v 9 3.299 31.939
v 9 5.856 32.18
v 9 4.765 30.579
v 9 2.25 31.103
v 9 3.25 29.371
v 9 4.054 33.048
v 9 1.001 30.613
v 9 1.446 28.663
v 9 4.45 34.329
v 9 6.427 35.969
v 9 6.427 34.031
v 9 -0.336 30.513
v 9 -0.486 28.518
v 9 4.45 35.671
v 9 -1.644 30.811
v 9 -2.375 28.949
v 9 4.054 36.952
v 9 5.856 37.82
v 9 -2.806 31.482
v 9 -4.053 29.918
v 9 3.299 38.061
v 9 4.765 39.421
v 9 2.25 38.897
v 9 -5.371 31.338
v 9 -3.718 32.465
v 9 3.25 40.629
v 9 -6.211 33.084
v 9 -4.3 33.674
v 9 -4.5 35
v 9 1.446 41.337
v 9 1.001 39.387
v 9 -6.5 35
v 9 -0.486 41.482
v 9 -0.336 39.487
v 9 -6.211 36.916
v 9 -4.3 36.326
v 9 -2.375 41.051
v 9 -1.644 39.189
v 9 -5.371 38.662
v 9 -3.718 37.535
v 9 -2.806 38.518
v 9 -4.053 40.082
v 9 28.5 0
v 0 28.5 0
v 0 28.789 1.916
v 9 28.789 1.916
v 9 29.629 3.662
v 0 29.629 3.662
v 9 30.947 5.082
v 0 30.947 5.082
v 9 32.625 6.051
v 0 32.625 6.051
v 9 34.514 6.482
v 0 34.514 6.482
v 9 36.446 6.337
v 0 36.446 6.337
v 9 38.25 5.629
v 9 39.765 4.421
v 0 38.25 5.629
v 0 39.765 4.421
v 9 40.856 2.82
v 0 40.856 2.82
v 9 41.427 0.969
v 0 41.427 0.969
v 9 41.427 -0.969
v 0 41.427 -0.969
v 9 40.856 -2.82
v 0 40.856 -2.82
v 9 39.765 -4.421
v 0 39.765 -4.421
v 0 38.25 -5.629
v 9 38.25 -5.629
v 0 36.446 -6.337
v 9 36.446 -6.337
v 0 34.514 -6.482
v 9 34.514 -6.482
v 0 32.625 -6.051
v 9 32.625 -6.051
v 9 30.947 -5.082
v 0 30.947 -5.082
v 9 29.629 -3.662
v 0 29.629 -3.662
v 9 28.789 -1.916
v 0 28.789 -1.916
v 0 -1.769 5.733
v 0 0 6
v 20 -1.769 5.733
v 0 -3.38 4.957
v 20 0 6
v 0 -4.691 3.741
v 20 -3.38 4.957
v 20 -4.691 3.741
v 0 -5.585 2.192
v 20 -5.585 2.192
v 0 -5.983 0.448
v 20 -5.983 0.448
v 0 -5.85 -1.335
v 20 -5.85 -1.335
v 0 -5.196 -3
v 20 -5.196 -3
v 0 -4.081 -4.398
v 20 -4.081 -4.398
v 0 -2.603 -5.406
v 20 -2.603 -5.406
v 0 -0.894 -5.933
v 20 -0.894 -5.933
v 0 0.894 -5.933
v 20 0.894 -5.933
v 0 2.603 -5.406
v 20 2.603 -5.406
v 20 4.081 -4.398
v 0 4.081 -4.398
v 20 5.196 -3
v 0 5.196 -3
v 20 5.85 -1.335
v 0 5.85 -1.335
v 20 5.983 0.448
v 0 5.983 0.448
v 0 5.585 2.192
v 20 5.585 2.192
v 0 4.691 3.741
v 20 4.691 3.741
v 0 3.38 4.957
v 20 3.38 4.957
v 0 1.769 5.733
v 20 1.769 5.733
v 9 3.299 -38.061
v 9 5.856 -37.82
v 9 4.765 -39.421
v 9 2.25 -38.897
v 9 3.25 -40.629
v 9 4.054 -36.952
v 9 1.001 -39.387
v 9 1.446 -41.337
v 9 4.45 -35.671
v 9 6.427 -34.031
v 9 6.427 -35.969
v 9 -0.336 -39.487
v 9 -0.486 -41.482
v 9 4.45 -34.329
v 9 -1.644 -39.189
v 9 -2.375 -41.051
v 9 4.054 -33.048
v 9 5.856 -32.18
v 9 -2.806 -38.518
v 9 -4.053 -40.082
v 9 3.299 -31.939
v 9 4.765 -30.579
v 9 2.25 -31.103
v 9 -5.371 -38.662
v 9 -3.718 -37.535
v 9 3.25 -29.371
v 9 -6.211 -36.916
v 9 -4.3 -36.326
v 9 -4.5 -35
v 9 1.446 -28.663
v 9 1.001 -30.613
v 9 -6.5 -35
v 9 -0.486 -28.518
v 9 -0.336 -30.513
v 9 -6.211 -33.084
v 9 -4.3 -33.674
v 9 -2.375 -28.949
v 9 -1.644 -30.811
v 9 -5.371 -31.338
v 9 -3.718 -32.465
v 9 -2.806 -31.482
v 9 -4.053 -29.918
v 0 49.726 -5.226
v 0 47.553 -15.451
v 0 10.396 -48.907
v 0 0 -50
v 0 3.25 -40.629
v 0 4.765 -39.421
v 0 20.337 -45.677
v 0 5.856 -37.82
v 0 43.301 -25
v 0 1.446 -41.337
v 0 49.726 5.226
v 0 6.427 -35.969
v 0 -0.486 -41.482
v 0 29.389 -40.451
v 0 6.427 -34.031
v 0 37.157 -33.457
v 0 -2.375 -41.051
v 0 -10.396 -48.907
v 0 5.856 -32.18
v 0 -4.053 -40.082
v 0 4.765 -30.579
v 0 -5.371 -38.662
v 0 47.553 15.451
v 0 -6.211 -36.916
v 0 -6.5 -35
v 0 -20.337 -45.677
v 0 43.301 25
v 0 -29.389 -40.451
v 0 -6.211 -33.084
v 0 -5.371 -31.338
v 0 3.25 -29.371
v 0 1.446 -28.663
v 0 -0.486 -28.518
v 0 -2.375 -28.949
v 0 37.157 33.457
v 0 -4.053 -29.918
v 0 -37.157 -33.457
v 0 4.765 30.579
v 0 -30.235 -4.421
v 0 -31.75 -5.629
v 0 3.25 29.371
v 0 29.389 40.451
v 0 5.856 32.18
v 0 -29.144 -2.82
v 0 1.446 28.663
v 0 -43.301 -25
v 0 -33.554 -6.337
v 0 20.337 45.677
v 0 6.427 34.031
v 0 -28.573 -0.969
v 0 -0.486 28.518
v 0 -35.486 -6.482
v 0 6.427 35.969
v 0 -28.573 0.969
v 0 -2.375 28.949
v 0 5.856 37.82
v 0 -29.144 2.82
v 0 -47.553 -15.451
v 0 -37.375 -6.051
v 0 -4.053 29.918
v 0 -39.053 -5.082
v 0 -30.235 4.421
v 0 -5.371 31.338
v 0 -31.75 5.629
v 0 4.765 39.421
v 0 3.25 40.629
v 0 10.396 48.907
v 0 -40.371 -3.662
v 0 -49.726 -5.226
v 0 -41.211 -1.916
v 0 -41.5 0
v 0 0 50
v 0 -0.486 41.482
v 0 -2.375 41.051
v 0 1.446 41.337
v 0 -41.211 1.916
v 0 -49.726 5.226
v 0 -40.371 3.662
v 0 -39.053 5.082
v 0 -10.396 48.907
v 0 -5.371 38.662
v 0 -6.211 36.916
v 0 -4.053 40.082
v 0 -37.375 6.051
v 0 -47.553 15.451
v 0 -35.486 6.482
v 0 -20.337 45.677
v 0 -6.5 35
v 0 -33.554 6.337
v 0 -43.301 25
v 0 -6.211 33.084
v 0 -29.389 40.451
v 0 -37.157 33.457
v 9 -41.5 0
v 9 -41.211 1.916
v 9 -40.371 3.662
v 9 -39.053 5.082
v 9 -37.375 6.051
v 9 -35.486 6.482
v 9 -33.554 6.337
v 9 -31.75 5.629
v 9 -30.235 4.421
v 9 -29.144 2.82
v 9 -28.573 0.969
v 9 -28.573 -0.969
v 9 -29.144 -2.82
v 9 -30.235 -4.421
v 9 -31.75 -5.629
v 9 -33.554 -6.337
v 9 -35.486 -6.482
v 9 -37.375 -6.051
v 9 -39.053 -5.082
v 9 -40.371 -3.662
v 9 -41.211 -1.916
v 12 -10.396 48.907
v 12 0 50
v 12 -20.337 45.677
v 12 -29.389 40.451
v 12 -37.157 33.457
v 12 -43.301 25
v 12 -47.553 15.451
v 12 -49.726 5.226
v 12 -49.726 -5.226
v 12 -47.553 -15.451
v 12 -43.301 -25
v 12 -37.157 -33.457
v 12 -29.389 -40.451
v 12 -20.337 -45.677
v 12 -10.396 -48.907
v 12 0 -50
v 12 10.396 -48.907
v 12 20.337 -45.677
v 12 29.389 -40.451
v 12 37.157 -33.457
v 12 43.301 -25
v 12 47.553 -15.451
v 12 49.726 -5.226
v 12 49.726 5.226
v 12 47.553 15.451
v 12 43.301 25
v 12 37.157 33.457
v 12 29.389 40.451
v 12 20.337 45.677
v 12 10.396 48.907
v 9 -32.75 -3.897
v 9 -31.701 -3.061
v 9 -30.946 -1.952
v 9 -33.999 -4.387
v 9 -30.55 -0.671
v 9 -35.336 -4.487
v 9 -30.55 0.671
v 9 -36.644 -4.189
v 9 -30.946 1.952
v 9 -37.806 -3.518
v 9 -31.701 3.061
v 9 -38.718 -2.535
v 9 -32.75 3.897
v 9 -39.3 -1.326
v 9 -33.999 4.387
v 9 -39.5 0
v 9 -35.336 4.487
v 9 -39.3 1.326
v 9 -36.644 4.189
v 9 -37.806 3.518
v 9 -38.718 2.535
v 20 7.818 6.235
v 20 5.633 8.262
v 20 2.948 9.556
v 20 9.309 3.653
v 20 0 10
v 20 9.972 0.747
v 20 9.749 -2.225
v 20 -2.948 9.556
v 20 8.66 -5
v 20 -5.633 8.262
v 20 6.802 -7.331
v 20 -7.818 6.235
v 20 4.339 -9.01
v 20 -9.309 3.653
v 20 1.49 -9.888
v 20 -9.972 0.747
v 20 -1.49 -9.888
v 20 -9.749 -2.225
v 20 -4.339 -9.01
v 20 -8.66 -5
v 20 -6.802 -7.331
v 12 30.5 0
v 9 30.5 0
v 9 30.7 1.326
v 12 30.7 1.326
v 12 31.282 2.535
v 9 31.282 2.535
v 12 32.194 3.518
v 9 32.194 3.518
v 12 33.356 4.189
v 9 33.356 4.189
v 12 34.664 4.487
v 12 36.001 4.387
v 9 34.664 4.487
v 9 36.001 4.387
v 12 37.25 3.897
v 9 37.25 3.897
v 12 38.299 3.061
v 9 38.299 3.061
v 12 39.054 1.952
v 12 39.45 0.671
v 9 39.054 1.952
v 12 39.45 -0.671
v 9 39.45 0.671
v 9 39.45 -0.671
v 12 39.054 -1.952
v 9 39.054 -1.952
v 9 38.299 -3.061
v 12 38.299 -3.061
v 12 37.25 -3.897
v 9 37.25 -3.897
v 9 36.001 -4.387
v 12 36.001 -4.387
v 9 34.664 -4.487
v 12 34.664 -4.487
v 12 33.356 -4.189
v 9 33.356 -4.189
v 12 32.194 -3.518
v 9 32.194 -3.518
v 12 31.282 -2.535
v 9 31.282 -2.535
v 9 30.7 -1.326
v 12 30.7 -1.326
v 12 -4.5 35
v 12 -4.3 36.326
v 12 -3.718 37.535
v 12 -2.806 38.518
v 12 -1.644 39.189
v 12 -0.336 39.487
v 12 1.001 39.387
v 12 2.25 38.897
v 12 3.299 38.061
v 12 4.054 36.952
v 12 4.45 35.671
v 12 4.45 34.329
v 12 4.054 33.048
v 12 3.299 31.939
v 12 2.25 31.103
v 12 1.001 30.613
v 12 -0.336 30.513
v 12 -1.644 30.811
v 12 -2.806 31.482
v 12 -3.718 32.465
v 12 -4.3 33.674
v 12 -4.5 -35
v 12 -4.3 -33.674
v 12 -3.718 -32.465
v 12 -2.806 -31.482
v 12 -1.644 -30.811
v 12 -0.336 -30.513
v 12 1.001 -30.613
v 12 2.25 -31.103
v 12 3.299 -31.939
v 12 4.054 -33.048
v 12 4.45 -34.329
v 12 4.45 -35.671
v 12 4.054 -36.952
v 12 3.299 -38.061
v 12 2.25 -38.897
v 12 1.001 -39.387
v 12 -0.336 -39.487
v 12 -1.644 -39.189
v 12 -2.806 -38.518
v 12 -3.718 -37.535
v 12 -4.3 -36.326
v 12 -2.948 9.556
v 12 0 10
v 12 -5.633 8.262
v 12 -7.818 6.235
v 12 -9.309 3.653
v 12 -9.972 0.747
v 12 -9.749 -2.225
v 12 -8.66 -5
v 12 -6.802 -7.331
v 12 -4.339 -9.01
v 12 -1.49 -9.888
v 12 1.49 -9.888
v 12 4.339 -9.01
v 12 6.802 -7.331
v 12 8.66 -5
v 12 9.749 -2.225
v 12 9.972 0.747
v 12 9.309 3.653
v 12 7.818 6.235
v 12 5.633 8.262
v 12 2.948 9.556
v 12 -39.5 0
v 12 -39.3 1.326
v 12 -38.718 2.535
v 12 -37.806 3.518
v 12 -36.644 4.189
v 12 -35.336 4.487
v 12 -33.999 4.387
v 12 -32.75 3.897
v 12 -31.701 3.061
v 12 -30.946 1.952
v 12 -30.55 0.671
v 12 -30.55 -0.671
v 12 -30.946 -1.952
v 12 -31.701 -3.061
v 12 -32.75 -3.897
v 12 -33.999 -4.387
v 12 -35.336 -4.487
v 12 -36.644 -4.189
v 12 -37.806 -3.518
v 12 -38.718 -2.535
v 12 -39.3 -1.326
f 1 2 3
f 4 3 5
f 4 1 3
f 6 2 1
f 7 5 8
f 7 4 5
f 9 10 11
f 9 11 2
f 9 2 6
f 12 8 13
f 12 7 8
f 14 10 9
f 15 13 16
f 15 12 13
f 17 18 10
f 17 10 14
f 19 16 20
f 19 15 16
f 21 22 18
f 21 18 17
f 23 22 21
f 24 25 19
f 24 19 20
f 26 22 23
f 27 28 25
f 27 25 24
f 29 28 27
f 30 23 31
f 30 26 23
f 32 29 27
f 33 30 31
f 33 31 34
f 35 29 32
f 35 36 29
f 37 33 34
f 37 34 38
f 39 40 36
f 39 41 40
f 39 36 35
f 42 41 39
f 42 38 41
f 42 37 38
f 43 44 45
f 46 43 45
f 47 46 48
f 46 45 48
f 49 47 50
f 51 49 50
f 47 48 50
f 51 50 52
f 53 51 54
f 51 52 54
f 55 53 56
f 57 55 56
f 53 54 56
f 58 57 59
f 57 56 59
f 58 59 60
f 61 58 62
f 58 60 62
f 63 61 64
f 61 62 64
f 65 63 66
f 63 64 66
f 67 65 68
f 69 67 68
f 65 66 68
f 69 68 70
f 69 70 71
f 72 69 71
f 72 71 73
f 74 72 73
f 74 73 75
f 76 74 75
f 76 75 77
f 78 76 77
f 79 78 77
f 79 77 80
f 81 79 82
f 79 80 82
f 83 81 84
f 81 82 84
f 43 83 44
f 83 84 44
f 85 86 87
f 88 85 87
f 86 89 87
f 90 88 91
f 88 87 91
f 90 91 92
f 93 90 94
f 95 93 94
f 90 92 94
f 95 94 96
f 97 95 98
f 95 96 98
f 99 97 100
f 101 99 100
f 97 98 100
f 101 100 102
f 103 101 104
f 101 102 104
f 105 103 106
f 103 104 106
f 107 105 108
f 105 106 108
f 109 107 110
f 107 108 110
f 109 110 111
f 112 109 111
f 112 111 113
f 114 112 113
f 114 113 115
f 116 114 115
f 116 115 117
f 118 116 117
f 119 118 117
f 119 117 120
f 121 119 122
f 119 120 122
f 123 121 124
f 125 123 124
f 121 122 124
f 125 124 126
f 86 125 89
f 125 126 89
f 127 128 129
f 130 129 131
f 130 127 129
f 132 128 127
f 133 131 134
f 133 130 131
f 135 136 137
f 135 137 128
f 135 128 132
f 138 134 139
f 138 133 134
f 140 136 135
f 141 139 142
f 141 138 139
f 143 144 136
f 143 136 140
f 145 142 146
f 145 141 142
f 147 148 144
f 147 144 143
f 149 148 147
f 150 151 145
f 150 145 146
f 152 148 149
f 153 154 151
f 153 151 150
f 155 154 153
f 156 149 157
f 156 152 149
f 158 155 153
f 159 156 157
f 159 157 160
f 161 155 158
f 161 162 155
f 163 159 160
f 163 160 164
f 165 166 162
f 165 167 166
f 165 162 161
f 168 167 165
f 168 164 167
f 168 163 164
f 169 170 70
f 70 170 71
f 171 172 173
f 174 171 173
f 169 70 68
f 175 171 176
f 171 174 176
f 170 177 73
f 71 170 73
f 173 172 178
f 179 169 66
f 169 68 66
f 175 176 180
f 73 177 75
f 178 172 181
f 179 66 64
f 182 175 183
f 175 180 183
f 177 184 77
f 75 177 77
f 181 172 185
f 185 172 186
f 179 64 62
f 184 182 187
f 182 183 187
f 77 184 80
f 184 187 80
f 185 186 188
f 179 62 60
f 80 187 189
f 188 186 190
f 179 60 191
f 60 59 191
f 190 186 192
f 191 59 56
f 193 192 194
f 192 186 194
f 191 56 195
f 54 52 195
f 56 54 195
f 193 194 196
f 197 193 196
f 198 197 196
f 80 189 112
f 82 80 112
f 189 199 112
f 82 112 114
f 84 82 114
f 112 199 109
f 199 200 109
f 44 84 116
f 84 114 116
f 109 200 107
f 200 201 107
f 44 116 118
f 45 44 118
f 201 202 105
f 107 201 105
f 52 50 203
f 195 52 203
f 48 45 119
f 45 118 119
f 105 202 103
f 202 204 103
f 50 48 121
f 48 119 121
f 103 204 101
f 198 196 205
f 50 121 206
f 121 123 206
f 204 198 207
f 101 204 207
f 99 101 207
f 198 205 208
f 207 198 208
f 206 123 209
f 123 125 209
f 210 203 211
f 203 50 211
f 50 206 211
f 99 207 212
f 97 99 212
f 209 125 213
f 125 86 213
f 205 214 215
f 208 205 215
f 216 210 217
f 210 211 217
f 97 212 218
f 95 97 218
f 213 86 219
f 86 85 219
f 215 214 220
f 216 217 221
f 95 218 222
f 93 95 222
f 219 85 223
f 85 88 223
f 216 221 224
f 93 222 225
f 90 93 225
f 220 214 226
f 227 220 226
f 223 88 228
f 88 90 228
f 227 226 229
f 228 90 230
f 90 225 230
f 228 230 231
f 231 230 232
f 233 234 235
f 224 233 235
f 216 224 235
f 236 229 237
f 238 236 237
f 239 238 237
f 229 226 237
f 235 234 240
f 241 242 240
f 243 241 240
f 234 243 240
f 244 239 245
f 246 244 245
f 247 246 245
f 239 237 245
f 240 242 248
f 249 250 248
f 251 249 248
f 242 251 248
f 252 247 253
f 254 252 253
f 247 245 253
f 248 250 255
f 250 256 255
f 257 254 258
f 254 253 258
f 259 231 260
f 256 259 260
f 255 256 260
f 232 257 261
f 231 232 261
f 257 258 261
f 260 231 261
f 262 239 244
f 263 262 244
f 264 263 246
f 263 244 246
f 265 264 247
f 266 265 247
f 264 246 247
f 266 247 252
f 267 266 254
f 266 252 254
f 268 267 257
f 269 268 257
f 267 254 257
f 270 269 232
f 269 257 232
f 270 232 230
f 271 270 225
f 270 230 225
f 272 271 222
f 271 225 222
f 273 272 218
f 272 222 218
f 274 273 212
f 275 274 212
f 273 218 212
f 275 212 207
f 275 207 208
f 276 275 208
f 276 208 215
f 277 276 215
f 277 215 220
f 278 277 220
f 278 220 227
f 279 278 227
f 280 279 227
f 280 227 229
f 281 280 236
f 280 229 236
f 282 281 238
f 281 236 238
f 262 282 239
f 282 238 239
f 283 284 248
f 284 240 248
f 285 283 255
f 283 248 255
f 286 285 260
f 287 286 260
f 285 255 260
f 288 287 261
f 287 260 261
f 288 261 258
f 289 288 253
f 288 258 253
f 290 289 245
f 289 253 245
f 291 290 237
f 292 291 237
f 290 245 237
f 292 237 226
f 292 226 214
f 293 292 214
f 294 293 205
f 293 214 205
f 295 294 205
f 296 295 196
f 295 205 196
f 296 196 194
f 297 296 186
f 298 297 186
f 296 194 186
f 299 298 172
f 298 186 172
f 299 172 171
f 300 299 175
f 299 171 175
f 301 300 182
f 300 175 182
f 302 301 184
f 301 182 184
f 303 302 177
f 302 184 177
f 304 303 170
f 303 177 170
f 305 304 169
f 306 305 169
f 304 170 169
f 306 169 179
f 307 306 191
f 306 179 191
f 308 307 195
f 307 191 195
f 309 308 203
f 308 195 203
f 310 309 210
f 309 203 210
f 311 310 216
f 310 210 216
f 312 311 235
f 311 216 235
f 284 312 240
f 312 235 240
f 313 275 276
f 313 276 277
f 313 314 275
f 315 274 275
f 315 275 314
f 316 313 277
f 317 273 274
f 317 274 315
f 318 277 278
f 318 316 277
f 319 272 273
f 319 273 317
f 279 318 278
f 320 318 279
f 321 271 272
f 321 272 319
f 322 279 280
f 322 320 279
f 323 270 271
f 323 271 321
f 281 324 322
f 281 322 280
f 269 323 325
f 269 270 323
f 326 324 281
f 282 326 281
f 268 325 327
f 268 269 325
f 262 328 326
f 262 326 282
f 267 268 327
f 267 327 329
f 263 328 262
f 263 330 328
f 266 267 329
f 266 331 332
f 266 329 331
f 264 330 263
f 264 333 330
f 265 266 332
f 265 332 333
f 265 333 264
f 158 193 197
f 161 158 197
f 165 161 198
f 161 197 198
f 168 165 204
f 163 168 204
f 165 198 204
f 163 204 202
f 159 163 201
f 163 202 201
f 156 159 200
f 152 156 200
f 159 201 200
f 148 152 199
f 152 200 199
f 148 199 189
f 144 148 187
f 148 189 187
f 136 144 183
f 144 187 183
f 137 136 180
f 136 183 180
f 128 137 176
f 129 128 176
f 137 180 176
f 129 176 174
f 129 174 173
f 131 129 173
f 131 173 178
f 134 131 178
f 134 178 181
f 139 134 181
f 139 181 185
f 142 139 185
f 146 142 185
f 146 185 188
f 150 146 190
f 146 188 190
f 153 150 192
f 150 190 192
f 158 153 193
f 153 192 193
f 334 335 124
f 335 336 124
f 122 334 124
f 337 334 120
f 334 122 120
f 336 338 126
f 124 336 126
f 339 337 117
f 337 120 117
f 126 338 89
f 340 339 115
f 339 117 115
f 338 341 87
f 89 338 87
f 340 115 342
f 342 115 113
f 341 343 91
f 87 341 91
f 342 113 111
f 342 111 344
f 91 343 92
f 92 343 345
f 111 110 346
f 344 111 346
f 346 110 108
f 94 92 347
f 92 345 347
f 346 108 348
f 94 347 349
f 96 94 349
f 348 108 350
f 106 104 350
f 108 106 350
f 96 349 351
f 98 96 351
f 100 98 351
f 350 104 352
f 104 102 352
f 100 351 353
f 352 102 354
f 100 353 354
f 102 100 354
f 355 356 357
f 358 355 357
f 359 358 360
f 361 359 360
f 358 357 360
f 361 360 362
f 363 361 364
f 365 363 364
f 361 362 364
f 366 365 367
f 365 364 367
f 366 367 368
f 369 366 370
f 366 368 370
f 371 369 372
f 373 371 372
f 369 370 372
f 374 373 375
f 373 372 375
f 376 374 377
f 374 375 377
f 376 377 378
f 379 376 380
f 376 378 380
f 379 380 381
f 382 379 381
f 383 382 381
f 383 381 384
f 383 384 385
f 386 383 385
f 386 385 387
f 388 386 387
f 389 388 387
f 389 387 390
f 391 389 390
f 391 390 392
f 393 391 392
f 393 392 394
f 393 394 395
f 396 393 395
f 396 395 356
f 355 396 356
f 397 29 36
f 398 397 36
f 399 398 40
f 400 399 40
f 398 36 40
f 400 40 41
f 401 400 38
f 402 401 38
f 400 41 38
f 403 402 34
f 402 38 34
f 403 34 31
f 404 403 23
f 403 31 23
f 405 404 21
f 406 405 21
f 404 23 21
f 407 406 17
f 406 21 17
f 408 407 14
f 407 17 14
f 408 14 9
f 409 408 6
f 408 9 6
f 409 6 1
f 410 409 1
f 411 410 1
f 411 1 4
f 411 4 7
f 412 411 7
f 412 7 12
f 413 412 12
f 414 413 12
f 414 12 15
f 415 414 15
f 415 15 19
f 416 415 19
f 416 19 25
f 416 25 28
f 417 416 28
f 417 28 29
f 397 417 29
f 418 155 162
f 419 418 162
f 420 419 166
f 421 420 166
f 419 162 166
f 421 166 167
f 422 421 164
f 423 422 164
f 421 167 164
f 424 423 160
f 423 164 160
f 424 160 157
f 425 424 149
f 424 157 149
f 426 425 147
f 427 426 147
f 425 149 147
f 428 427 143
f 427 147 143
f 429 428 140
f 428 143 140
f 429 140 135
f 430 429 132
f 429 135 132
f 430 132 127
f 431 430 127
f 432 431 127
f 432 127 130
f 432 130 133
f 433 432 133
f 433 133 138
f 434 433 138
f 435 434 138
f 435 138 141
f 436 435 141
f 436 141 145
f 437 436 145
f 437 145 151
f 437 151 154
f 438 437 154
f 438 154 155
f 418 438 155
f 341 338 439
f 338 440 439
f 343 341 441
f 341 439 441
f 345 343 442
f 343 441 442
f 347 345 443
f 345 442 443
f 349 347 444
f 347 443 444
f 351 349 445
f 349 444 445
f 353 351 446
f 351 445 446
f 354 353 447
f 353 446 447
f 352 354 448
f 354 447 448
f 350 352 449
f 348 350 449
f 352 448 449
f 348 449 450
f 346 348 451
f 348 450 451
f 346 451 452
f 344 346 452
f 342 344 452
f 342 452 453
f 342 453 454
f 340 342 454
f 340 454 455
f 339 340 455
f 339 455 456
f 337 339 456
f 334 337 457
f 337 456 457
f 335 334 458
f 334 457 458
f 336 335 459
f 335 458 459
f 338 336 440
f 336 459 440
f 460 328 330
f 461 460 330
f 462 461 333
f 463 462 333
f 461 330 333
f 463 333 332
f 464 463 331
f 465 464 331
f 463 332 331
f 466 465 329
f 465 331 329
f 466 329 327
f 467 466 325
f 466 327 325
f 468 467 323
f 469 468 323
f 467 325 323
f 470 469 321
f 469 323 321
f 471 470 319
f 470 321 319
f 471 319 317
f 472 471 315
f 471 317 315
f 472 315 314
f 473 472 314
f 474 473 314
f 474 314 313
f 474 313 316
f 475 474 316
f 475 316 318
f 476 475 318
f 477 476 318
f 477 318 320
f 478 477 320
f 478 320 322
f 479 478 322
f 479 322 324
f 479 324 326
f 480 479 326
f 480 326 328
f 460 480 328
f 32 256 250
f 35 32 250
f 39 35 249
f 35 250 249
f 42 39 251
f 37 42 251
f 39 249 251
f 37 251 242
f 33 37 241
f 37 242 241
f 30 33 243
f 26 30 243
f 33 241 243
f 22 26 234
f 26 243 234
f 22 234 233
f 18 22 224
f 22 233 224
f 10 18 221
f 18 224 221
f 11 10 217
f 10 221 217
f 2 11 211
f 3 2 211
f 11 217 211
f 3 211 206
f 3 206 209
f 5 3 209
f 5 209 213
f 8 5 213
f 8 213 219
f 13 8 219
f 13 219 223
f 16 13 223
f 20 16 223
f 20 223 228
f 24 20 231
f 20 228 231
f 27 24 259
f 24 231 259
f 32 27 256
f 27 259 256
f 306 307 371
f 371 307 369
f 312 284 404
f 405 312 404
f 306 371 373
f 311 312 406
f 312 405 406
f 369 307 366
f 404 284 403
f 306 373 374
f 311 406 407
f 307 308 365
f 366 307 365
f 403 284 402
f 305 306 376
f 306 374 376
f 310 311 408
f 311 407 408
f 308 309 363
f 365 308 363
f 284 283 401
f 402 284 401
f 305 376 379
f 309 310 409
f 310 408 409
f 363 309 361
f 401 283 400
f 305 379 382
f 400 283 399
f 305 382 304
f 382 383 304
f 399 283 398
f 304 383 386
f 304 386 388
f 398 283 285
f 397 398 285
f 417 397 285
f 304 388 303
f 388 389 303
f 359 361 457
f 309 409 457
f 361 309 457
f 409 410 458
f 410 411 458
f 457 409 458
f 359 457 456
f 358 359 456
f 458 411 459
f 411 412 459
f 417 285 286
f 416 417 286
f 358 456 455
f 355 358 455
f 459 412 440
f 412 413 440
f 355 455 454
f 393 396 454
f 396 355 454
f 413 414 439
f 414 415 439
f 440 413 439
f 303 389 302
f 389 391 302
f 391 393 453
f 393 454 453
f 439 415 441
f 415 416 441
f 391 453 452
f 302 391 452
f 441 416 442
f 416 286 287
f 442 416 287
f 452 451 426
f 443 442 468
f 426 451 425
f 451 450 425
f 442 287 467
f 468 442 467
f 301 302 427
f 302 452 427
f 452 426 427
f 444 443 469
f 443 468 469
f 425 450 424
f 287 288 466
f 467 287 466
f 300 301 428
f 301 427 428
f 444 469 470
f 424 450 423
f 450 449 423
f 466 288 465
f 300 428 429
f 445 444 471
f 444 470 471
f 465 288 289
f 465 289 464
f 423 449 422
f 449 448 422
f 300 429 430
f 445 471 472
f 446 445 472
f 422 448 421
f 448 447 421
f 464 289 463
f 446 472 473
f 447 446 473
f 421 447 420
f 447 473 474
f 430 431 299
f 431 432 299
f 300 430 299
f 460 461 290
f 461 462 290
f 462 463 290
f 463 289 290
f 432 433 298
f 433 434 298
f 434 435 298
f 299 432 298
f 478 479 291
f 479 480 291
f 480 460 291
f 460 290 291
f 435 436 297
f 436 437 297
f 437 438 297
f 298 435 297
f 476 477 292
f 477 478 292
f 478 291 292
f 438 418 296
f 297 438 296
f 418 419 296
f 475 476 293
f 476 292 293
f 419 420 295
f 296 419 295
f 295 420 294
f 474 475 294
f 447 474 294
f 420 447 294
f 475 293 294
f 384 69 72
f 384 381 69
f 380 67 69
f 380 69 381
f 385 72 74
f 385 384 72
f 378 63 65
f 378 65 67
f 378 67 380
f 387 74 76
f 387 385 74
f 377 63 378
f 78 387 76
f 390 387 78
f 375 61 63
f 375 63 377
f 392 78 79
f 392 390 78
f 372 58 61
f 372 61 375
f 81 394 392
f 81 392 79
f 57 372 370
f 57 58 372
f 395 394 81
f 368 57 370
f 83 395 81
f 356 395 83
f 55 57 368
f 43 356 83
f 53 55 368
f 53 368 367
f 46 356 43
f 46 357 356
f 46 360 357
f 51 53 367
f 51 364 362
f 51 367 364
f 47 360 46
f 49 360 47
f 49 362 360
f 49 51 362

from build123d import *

# Parameters (mm, degrees)
F2_R     = 6.5
F2_R_2   = 4.5
F3_DEPTH = 9
F4_DEPTH = 20.001


with BuildPart() as f1:
    # F0 (on Front) → F1 (revolve)
    with BuildSketch(Plane.XZ):
        Polygon((0, 50), (0, 6), (20, 6), (20, 10), (12, 10), (12, 50), align=None)
    revolve(axis=Axis((26.5880525112, 0, 0), (1, 0, 0)))

    # F2 (on face) → F3 (cut)
    with BuildSketch(Plane(origin=(0, 0, 0), x_dir=(0, -1, 0), z_dir=(-1, 0, 0))):
        with Locations((0, 35)):
            Circle(F2_R)
        with Locations((0, 35)):
            Circle(F2_R_2, mode=Mode.SUBTRACT)
        with Locations((-35, 0)):
            Circle(F2_R)
        with Locations((-35, 0)):
            Circle(F2_R_2, mode=Mode.SUBTRACT)
        with Locations((0, -35)):
            Circle(F2_R)
        with Locations((0, -35)):
            Circle(F2_R_2, mode=Mode.SUBTRACT)
        with Locations((35, 0)):
            Circle(F2_R)
        with Locations((35, 0)):
            Circle(F2_R_2, mode=Mode.SUBTRACT)
    extrude(amount=-F3_DEPTH, mode=Mode.SUBTRACT)

    # F4 (cut, through all): faces of the model
    f4_faces = [f1.faces().sort_by_distance(p)[0] for p in [
        (0, 0, 35),
        (0, 35, 0),
        (0, 0, -35),
        (0, -35, 0),
    ]]
    extrude(f4_faces, amount=-F4_DEPTH, mode=Mode.SUBTRACT)


solid = f1.part
